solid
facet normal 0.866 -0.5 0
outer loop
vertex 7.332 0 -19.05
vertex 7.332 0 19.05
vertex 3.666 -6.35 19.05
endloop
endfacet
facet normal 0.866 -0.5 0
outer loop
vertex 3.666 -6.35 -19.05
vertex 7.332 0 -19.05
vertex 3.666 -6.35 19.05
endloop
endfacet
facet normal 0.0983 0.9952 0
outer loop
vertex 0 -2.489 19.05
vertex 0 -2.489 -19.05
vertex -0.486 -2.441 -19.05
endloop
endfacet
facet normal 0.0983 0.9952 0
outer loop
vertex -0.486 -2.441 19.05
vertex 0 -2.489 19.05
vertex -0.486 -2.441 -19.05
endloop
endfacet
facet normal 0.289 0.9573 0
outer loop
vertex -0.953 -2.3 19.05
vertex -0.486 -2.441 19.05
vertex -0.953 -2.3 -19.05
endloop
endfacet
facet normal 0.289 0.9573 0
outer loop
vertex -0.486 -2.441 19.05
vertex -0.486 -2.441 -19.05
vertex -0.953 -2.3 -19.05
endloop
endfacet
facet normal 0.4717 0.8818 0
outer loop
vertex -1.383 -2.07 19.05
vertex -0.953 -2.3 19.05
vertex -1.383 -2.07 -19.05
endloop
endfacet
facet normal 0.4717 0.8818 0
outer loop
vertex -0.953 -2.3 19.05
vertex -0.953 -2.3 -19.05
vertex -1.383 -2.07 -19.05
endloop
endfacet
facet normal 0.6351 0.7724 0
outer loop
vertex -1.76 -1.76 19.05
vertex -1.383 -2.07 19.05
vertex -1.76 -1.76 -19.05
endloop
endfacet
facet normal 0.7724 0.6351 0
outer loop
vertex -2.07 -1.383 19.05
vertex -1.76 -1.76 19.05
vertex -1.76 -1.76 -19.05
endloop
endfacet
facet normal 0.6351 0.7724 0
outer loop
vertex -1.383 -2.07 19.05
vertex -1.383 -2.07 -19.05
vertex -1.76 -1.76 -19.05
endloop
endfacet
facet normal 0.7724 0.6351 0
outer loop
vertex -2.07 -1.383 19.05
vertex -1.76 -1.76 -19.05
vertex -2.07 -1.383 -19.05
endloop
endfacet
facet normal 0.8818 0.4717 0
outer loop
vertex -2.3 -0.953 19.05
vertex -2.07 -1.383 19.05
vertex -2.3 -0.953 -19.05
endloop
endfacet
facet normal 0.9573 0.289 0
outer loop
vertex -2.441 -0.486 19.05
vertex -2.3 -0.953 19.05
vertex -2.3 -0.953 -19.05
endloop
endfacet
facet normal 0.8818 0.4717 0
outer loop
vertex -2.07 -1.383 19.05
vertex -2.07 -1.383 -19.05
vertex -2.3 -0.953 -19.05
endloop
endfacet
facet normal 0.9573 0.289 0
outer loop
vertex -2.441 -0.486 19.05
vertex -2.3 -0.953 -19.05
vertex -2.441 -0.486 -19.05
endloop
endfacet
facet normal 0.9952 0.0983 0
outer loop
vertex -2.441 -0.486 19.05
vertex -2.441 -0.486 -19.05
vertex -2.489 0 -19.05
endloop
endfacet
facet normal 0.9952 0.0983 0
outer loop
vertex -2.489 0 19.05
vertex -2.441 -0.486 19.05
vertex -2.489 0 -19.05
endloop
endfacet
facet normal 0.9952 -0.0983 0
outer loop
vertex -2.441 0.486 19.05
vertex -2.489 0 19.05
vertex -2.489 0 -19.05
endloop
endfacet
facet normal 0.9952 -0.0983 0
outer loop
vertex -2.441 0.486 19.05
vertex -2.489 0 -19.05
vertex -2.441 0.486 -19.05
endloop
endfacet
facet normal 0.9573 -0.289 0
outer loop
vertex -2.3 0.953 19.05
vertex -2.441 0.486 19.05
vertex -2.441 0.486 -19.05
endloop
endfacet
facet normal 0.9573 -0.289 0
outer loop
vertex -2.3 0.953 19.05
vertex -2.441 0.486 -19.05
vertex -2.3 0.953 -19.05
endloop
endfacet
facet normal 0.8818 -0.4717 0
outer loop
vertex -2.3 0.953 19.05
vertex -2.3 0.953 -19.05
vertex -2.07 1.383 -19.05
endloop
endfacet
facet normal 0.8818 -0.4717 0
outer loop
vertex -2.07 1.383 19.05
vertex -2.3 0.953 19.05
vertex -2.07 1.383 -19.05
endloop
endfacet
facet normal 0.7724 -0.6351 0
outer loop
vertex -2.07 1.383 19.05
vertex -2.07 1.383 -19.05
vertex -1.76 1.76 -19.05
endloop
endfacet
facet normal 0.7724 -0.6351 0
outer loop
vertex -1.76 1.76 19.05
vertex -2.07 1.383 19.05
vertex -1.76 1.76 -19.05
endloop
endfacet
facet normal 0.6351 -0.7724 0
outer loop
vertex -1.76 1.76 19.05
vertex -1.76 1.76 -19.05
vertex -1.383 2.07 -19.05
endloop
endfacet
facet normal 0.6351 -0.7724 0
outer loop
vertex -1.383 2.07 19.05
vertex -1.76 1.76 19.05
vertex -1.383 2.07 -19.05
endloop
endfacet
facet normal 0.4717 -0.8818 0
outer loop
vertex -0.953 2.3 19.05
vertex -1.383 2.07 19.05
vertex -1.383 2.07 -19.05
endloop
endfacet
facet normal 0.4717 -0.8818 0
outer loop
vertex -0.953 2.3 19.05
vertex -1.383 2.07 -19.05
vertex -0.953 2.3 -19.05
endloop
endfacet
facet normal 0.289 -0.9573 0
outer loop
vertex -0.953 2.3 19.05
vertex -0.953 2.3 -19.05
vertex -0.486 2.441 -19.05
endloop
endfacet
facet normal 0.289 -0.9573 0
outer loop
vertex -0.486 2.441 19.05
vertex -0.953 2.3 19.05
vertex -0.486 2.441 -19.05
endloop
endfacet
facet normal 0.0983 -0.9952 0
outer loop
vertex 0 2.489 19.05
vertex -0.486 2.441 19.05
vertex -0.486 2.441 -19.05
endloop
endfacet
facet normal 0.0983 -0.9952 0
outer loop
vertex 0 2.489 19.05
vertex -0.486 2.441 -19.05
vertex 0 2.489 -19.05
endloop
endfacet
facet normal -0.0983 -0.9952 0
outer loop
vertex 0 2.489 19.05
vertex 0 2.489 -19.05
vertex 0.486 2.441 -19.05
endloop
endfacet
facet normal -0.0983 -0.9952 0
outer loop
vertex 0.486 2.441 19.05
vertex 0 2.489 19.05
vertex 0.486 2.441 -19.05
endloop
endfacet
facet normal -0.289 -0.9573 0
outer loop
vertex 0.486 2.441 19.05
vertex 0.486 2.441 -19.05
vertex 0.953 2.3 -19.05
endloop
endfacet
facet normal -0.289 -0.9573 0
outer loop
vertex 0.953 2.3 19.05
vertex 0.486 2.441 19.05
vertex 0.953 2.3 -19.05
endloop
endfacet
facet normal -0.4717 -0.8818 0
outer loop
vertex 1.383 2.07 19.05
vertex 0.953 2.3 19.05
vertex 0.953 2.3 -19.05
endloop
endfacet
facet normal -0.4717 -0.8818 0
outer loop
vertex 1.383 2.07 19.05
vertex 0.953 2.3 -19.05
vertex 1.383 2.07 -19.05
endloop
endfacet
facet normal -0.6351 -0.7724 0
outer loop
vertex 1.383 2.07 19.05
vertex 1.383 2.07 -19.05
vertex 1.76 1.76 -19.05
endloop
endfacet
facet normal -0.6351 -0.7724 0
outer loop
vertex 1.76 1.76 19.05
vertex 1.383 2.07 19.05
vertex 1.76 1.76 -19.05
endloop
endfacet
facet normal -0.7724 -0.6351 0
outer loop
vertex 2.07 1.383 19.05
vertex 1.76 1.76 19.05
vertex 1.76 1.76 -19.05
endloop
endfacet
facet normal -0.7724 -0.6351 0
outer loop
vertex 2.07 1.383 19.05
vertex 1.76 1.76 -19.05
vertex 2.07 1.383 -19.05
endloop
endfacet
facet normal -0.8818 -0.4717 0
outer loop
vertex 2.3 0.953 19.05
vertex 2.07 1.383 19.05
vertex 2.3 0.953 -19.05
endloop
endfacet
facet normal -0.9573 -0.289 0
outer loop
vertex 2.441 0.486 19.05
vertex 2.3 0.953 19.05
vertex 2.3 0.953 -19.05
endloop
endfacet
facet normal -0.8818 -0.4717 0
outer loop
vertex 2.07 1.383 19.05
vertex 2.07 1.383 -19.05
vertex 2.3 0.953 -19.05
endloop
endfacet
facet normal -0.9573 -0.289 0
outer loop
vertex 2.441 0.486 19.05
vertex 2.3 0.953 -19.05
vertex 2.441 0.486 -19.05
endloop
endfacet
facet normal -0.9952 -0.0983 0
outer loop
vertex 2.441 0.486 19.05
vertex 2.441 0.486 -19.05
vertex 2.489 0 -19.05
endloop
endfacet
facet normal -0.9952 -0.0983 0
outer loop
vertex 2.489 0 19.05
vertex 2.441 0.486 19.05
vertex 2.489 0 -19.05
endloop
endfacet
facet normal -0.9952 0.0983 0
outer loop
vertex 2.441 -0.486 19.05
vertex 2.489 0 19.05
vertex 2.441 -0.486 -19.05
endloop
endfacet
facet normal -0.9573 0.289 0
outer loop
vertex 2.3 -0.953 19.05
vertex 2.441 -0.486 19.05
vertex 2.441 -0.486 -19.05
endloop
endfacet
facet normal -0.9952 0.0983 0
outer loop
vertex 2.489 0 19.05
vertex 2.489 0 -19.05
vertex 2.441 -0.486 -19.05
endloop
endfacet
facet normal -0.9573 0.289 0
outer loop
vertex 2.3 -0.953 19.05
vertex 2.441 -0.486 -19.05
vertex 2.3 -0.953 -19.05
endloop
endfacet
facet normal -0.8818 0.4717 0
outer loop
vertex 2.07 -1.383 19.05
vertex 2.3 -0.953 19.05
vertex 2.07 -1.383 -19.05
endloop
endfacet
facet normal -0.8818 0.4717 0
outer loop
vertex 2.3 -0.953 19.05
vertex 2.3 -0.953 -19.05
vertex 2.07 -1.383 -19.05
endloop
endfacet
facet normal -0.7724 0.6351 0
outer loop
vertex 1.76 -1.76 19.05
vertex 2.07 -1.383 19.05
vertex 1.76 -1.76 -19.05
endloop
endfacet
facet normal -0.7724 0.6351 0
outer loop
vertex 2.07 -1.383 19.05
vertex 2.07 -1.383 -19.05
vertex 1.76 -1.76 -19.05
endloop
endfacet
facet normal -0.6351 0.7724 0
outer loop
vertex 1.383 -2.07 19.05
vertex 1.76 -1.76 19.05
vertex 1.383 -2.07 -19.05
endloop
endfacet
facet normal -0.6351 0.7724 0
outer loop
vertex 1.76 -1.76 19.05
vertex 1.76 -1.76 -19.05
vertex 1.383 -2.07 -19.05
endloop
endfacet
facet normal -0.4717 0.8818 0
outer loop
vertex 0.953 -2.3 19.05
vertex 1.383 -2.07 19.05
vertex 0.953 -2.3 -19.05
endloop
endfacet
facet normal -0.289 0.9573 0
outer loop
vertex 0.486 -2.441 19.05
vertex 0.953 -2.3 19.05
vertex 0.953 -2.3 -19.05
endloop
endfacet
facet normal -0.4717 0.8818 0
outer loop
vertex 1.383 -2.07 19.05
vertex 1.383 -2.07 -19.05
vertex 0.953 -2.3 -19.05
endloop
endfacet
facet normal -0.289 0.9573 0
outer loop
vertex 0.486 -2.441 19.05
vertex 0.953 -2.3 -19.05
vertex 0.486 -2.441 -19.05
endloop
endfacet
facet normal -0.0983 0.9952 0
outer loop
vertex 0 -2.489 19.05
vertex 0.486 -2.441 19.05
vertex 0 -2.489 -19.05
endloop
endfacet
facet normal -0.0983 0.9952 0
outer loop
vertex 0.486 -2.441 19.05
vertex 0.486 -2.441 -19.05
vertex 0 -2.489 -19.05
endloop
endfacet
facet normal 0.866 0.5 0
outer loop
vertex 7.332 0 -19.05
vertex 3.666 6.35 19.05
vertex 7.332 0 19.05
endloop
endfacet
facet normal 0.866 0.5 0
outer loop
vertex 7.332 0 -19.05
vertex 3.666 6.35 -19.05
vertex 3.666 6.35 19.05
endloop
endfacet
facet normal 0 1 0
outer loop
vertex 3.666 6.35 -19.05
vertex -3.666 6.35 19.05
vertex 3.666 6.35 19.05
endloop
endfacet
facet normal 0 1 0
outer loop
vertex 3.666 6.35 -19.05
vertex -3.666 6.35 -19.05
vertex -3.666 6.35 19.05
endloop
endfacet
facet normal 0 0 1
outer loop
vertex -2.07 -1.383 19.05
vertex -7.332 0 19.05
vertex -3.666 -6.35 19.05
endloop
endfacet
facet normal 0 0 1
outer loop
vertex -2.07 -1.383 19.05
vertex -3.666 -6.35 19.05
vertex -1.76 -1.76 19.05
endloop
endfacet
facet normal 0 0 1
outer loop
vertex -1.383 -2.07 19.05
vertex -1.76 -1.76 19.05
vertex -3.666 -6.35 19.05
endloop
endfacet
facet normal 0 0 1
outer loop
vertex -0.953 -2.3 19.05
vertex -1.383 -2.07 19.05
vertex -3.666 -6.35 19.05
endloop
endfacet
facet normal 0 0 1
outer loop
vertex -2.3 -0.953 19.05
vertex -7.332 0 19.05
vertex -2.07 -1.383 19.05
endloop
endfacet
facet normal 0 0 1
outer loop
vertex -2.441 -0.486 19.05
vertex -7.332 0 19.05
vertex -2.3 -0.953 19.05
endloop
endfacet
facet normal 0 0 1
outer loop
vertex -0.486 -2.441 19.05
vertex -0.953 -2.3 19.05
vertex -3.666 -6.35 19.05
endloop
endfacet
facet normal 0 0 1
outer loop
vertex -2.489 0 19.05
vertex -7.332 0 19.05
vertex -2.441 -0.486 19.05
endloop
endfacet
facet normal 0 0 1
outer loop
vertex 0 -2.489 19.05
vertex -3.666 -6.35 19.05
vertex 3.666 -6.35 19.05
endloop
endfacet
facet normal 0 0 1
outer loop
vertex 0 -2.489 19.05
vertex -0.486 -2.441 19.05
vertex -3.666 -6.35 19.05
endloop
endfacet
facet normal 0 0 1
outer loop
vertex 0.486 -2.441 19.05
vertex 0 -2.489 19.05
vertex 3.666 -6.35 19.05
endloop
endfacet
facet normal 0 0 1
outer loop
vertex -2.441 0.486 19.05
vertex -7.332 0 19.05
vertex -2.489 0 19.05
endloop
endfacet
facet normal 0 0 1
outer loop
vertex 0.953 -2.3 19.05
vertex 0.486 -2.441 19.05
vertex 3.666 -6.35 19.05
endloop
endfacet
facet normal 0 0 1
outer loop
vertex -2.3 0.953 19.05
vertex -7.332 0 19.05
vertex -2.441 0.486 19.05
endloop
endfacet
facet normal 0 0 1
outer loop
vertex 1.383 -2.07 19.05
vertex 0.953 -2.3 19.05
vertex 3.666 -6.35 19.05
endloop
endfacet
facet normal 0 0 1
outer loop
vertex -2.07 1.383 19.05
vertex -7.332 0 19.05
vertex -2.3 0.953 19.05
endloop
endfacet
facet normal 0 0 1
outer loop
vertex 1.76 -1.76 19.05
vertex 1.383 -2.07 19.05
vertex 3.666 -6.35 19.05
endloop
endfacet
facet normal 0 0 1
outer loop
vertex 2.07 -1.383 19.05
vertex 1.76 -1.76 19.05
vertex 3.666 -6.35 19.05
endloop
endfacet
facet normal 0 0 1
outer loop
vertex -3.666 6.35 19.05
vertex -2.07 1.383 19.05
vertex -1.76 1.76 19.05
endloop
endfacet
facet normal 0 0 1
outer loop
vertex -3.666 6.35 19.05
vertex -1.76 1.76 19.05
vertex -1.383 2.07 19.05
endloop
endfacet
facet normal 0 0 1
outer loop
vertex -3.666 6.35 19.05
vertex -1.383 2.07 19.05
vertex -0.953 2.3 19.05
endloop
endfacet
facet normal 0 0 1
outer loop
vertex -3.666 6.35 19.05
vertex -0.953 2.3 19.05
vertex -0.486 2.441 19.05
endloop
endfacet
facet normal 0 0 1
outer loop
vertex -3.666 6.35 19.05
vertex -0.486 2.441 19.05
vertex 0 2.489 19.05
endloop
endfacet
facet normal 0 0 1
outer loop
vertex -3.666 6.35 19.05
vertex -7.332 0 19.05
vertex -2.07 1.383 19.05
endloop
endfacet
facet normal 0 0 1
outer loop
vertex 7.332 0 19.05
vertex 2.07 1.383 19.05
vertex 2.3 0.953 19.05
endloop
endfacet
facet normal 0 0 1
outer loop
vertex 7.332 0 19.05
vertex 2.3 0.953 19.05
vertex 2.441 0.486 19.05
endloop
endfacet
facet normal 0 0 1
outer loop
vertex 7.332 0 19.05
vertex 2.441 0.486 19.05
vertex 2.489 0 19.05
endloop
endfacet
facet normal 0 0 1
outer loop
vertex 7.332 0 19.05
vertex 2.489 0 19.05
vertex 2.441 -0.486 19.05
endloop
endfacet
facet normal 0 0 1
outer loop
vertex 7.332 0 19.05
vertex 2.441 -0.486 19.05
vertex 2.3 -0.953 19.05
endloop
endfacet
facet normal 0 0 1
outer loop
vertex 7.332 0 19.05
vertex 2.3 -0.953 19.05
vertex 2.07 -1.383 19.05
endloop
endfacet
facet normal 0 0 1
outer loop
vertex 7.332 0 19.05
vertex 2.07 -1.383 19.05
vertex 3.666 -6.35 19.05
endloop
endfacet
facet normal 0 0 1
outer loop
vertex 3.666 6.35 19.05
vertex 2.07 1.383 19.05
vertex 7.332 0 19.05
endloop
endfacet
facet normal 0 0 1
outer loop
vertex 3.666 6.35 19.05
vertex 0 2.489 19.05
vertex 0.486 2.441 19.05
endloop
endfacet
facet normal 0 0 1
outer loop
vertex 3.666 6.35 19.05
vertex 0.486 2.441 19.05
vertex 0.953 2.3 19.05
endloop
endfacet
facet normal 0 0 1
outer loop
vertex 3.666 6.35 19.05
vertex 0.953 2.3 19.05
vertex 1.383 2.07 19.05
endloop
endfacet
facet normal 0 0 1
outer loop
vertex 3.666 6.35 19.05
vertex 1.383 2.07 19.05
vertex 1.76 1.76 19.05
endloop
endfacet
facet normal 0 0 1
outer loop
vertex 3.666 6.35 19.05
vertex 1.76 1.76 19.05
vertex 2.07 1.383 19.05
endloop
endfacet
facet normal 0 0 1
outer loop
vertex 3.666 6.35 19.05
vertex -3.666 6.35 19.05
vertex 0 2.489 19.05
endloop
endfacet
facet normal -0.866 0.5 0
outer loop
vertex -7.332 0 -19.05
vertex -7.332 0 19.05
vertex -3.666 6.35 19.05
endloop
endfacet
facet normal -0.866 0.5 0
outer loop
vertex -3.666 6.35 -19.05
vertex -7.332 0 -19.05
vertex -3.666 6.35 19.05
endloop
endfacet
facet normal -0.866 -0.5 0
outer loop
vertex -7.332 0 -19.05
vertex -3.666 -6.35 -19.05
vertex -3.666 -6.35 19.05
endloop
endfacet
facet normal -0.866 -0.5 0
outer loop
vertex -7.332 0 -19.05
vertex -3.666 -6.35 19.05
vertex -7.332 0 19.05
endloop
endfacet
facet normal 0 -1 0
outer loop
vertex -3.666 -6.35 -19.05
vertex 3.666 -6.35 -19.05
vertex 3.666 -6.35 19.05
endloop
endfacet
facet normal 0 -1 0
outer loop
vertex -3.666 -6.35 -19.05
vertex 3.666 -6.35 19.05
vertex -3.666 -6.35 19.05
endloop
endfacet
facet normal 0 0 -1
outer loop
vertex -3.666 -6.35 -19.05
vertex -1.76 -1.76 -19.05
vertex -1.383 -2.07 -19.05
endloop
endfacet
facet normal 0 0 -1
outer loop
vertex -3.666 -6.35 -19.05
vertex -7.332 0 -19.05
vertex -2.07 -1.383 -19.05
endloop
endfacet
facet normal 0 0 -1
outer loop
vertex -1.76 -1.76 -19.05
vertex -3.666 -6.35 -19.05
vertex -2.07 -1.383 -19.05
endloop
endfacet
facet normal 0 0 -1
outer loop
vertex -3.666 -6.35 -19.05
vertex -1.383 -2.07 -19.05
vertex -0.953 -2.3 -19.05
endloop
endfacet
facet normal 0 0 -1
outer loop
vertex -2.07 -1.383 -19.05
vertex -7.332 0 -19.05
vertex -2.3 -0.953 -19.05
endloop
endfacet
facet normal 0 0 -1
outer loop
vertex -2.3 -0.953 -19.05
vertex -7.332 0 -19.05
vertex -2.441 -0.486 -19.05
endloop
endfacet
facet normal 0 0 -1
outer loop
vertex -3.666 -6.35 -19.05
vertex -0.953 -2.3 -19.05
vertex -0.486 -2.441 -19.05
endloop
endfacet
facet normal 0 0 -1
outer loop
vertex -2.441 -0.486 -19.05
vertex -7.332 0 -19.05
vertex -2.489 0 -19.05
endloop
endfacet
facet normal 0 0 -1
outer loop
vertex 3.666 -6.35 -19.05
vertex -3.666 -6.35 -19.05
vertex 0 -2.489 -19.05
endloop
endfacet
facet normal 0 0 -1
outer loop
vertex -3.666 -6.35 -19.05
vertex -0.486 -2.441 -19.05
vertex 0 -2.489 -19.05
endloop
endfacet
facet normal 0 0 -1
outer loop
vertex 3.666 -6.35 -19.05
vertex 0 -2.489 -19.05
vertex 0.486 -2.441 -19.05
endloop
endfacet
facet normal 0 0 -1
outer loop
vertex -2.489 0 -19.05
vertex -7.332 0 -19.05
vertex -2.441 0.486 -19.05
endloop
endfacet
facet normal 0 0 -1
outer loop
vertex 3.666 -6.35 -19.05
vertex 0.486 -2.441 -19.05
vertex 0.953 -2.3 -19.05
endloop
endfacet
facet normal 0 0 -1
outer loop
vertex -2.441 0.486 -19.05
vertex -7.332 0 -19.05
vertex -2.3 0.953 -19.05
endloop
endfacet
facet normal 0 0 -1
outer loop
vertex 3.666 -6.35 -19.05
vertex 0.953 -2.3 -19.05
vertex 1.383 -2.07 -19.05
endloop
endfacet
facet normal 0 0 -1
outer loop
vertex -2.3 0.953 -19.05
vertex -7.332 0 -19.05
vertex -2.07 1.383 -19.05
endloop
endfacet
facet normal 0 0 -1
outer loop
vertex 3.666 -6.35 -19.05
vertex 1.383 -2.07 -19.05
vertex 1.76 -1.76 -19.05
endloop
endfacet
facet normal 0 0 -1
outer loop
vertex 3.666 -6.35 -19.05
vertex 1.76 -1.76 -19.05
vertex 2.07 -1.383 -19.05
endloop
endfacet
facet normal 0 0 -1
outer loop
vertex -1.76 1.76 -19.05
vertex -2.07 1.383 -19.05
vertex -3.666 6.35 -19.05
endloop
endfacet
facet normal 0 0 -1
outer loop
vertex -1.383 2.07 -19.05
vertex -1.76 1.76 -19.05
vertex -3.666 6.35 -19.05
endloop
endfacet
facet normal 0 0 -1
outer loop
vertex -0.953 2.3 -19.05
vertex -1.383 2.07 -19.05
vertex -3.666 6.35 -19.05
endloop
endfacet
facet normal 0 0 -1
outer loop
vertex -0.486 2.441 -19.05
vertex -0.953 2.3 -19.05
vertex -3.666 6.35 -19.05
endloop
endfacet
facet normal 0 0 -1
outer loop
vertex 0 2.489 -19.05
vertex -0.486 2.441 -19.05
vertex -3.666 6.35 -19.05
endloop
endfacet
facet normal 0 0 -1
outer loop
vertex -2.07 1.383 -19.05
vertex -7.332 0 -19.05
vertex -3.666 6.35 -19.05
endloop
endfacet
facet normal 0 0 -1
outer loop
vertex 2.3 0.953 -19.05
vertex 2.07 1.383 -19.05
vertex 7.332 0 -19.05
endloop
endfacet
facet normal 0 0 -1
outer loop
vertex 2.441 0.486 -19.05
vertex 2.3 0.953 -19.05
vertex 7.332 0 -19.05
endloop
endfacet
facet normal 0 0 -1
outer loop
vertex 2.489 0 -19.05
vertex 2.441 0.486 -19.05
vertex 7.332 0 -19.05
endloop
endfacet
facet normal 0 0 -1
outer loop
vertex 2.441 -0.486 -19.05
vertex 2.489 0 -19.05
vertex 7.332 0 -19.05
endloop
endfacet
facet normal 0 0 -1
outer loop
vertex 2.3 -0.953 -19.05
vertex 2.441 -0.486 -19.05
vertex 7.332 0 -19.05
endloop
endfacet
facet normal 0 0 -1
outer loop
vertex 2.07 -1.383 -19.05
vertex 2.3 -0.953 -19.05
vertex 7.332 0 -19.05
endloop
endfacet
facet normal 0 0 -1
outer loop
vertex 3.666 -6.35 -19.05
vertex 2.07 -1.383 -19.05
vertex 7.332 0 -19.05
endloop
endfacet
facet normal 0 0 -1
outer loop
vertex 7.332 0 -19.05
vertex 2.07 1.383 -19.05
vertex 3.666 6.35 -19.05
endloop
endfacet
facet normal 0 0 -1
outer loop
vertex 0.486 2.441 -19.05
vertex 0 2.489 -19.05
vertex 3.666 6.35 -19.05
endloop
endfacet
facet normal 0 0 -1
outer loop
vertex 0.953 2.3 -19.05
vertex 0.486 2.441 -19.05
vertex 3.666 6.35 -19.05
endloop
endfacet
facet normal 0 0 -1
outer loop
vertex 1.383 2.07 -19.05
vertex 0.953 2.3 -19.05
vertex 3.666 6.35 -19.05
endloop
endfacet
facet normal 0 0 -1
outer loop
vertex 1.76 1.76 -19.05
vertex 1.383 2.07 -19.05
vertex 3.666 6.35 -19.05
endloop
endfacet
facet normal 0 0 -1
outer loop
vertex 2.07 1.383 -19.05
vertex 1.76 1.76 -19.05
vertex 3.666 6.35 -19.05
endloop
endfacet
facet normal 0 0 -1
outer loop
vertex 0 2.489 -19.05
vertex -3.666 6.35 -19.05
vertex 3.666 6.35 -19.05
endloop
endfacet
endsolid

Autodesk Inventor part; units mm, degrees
ref_plane "YZ Plane" through (0, 0, 0) normal (1, 0, 0) x (0, 1, 0)
ref_plane "XZ Plane" through (0, 0, 0) normal (0, 1, 0) x (-1, 0, 0)
ref_plane "XY Plane" through (0, 0, 0) normal (0, 0, 1) x (1, 0, 0)
sketch "Sketch1" plane through (0, 0, 0) normal (0, 0, 1) x (1, 0, 0)
  line L0 (-3.6662, 6.35) -> (3.6662, 6.35)
  line L1 (3.6662, 6.35) -> (7.3323, 0)
  line L2 (7.3323, 0) -> (3.6662, -6.35)
  line L3 (3.6662, -6.35) -> (-3.6662, -6.35)
  line L4 (-3.6662, -6.35) -> (-7.3323, 0)
  line L5 (-7.3323, 0) -> (-3.6662, 6.35)
  point P0 (0, 0)
  point P1 (0, 0)
  dimension "d0" = 12.7
extrude "Extrusion1" add sketch "Sketch1" along normal mid plane 38.1
sketch "Sketch2" plane through (0, 0, 19.05) normal (0, 0, 1) x (1, 0, 0)
  point P0 (0, 0)
  point P1 (0, 0)
hole "Hole1" at (0, 0, 19.05) direction (0, 0, -1) diameter 4.9784 end through all thread size "1/4-20 UNC" class "2B" standard "ANSI Unified Screw Threads"
properties part number "Hex Standoff 14-20 x1500" material "Aluminum 6061"
